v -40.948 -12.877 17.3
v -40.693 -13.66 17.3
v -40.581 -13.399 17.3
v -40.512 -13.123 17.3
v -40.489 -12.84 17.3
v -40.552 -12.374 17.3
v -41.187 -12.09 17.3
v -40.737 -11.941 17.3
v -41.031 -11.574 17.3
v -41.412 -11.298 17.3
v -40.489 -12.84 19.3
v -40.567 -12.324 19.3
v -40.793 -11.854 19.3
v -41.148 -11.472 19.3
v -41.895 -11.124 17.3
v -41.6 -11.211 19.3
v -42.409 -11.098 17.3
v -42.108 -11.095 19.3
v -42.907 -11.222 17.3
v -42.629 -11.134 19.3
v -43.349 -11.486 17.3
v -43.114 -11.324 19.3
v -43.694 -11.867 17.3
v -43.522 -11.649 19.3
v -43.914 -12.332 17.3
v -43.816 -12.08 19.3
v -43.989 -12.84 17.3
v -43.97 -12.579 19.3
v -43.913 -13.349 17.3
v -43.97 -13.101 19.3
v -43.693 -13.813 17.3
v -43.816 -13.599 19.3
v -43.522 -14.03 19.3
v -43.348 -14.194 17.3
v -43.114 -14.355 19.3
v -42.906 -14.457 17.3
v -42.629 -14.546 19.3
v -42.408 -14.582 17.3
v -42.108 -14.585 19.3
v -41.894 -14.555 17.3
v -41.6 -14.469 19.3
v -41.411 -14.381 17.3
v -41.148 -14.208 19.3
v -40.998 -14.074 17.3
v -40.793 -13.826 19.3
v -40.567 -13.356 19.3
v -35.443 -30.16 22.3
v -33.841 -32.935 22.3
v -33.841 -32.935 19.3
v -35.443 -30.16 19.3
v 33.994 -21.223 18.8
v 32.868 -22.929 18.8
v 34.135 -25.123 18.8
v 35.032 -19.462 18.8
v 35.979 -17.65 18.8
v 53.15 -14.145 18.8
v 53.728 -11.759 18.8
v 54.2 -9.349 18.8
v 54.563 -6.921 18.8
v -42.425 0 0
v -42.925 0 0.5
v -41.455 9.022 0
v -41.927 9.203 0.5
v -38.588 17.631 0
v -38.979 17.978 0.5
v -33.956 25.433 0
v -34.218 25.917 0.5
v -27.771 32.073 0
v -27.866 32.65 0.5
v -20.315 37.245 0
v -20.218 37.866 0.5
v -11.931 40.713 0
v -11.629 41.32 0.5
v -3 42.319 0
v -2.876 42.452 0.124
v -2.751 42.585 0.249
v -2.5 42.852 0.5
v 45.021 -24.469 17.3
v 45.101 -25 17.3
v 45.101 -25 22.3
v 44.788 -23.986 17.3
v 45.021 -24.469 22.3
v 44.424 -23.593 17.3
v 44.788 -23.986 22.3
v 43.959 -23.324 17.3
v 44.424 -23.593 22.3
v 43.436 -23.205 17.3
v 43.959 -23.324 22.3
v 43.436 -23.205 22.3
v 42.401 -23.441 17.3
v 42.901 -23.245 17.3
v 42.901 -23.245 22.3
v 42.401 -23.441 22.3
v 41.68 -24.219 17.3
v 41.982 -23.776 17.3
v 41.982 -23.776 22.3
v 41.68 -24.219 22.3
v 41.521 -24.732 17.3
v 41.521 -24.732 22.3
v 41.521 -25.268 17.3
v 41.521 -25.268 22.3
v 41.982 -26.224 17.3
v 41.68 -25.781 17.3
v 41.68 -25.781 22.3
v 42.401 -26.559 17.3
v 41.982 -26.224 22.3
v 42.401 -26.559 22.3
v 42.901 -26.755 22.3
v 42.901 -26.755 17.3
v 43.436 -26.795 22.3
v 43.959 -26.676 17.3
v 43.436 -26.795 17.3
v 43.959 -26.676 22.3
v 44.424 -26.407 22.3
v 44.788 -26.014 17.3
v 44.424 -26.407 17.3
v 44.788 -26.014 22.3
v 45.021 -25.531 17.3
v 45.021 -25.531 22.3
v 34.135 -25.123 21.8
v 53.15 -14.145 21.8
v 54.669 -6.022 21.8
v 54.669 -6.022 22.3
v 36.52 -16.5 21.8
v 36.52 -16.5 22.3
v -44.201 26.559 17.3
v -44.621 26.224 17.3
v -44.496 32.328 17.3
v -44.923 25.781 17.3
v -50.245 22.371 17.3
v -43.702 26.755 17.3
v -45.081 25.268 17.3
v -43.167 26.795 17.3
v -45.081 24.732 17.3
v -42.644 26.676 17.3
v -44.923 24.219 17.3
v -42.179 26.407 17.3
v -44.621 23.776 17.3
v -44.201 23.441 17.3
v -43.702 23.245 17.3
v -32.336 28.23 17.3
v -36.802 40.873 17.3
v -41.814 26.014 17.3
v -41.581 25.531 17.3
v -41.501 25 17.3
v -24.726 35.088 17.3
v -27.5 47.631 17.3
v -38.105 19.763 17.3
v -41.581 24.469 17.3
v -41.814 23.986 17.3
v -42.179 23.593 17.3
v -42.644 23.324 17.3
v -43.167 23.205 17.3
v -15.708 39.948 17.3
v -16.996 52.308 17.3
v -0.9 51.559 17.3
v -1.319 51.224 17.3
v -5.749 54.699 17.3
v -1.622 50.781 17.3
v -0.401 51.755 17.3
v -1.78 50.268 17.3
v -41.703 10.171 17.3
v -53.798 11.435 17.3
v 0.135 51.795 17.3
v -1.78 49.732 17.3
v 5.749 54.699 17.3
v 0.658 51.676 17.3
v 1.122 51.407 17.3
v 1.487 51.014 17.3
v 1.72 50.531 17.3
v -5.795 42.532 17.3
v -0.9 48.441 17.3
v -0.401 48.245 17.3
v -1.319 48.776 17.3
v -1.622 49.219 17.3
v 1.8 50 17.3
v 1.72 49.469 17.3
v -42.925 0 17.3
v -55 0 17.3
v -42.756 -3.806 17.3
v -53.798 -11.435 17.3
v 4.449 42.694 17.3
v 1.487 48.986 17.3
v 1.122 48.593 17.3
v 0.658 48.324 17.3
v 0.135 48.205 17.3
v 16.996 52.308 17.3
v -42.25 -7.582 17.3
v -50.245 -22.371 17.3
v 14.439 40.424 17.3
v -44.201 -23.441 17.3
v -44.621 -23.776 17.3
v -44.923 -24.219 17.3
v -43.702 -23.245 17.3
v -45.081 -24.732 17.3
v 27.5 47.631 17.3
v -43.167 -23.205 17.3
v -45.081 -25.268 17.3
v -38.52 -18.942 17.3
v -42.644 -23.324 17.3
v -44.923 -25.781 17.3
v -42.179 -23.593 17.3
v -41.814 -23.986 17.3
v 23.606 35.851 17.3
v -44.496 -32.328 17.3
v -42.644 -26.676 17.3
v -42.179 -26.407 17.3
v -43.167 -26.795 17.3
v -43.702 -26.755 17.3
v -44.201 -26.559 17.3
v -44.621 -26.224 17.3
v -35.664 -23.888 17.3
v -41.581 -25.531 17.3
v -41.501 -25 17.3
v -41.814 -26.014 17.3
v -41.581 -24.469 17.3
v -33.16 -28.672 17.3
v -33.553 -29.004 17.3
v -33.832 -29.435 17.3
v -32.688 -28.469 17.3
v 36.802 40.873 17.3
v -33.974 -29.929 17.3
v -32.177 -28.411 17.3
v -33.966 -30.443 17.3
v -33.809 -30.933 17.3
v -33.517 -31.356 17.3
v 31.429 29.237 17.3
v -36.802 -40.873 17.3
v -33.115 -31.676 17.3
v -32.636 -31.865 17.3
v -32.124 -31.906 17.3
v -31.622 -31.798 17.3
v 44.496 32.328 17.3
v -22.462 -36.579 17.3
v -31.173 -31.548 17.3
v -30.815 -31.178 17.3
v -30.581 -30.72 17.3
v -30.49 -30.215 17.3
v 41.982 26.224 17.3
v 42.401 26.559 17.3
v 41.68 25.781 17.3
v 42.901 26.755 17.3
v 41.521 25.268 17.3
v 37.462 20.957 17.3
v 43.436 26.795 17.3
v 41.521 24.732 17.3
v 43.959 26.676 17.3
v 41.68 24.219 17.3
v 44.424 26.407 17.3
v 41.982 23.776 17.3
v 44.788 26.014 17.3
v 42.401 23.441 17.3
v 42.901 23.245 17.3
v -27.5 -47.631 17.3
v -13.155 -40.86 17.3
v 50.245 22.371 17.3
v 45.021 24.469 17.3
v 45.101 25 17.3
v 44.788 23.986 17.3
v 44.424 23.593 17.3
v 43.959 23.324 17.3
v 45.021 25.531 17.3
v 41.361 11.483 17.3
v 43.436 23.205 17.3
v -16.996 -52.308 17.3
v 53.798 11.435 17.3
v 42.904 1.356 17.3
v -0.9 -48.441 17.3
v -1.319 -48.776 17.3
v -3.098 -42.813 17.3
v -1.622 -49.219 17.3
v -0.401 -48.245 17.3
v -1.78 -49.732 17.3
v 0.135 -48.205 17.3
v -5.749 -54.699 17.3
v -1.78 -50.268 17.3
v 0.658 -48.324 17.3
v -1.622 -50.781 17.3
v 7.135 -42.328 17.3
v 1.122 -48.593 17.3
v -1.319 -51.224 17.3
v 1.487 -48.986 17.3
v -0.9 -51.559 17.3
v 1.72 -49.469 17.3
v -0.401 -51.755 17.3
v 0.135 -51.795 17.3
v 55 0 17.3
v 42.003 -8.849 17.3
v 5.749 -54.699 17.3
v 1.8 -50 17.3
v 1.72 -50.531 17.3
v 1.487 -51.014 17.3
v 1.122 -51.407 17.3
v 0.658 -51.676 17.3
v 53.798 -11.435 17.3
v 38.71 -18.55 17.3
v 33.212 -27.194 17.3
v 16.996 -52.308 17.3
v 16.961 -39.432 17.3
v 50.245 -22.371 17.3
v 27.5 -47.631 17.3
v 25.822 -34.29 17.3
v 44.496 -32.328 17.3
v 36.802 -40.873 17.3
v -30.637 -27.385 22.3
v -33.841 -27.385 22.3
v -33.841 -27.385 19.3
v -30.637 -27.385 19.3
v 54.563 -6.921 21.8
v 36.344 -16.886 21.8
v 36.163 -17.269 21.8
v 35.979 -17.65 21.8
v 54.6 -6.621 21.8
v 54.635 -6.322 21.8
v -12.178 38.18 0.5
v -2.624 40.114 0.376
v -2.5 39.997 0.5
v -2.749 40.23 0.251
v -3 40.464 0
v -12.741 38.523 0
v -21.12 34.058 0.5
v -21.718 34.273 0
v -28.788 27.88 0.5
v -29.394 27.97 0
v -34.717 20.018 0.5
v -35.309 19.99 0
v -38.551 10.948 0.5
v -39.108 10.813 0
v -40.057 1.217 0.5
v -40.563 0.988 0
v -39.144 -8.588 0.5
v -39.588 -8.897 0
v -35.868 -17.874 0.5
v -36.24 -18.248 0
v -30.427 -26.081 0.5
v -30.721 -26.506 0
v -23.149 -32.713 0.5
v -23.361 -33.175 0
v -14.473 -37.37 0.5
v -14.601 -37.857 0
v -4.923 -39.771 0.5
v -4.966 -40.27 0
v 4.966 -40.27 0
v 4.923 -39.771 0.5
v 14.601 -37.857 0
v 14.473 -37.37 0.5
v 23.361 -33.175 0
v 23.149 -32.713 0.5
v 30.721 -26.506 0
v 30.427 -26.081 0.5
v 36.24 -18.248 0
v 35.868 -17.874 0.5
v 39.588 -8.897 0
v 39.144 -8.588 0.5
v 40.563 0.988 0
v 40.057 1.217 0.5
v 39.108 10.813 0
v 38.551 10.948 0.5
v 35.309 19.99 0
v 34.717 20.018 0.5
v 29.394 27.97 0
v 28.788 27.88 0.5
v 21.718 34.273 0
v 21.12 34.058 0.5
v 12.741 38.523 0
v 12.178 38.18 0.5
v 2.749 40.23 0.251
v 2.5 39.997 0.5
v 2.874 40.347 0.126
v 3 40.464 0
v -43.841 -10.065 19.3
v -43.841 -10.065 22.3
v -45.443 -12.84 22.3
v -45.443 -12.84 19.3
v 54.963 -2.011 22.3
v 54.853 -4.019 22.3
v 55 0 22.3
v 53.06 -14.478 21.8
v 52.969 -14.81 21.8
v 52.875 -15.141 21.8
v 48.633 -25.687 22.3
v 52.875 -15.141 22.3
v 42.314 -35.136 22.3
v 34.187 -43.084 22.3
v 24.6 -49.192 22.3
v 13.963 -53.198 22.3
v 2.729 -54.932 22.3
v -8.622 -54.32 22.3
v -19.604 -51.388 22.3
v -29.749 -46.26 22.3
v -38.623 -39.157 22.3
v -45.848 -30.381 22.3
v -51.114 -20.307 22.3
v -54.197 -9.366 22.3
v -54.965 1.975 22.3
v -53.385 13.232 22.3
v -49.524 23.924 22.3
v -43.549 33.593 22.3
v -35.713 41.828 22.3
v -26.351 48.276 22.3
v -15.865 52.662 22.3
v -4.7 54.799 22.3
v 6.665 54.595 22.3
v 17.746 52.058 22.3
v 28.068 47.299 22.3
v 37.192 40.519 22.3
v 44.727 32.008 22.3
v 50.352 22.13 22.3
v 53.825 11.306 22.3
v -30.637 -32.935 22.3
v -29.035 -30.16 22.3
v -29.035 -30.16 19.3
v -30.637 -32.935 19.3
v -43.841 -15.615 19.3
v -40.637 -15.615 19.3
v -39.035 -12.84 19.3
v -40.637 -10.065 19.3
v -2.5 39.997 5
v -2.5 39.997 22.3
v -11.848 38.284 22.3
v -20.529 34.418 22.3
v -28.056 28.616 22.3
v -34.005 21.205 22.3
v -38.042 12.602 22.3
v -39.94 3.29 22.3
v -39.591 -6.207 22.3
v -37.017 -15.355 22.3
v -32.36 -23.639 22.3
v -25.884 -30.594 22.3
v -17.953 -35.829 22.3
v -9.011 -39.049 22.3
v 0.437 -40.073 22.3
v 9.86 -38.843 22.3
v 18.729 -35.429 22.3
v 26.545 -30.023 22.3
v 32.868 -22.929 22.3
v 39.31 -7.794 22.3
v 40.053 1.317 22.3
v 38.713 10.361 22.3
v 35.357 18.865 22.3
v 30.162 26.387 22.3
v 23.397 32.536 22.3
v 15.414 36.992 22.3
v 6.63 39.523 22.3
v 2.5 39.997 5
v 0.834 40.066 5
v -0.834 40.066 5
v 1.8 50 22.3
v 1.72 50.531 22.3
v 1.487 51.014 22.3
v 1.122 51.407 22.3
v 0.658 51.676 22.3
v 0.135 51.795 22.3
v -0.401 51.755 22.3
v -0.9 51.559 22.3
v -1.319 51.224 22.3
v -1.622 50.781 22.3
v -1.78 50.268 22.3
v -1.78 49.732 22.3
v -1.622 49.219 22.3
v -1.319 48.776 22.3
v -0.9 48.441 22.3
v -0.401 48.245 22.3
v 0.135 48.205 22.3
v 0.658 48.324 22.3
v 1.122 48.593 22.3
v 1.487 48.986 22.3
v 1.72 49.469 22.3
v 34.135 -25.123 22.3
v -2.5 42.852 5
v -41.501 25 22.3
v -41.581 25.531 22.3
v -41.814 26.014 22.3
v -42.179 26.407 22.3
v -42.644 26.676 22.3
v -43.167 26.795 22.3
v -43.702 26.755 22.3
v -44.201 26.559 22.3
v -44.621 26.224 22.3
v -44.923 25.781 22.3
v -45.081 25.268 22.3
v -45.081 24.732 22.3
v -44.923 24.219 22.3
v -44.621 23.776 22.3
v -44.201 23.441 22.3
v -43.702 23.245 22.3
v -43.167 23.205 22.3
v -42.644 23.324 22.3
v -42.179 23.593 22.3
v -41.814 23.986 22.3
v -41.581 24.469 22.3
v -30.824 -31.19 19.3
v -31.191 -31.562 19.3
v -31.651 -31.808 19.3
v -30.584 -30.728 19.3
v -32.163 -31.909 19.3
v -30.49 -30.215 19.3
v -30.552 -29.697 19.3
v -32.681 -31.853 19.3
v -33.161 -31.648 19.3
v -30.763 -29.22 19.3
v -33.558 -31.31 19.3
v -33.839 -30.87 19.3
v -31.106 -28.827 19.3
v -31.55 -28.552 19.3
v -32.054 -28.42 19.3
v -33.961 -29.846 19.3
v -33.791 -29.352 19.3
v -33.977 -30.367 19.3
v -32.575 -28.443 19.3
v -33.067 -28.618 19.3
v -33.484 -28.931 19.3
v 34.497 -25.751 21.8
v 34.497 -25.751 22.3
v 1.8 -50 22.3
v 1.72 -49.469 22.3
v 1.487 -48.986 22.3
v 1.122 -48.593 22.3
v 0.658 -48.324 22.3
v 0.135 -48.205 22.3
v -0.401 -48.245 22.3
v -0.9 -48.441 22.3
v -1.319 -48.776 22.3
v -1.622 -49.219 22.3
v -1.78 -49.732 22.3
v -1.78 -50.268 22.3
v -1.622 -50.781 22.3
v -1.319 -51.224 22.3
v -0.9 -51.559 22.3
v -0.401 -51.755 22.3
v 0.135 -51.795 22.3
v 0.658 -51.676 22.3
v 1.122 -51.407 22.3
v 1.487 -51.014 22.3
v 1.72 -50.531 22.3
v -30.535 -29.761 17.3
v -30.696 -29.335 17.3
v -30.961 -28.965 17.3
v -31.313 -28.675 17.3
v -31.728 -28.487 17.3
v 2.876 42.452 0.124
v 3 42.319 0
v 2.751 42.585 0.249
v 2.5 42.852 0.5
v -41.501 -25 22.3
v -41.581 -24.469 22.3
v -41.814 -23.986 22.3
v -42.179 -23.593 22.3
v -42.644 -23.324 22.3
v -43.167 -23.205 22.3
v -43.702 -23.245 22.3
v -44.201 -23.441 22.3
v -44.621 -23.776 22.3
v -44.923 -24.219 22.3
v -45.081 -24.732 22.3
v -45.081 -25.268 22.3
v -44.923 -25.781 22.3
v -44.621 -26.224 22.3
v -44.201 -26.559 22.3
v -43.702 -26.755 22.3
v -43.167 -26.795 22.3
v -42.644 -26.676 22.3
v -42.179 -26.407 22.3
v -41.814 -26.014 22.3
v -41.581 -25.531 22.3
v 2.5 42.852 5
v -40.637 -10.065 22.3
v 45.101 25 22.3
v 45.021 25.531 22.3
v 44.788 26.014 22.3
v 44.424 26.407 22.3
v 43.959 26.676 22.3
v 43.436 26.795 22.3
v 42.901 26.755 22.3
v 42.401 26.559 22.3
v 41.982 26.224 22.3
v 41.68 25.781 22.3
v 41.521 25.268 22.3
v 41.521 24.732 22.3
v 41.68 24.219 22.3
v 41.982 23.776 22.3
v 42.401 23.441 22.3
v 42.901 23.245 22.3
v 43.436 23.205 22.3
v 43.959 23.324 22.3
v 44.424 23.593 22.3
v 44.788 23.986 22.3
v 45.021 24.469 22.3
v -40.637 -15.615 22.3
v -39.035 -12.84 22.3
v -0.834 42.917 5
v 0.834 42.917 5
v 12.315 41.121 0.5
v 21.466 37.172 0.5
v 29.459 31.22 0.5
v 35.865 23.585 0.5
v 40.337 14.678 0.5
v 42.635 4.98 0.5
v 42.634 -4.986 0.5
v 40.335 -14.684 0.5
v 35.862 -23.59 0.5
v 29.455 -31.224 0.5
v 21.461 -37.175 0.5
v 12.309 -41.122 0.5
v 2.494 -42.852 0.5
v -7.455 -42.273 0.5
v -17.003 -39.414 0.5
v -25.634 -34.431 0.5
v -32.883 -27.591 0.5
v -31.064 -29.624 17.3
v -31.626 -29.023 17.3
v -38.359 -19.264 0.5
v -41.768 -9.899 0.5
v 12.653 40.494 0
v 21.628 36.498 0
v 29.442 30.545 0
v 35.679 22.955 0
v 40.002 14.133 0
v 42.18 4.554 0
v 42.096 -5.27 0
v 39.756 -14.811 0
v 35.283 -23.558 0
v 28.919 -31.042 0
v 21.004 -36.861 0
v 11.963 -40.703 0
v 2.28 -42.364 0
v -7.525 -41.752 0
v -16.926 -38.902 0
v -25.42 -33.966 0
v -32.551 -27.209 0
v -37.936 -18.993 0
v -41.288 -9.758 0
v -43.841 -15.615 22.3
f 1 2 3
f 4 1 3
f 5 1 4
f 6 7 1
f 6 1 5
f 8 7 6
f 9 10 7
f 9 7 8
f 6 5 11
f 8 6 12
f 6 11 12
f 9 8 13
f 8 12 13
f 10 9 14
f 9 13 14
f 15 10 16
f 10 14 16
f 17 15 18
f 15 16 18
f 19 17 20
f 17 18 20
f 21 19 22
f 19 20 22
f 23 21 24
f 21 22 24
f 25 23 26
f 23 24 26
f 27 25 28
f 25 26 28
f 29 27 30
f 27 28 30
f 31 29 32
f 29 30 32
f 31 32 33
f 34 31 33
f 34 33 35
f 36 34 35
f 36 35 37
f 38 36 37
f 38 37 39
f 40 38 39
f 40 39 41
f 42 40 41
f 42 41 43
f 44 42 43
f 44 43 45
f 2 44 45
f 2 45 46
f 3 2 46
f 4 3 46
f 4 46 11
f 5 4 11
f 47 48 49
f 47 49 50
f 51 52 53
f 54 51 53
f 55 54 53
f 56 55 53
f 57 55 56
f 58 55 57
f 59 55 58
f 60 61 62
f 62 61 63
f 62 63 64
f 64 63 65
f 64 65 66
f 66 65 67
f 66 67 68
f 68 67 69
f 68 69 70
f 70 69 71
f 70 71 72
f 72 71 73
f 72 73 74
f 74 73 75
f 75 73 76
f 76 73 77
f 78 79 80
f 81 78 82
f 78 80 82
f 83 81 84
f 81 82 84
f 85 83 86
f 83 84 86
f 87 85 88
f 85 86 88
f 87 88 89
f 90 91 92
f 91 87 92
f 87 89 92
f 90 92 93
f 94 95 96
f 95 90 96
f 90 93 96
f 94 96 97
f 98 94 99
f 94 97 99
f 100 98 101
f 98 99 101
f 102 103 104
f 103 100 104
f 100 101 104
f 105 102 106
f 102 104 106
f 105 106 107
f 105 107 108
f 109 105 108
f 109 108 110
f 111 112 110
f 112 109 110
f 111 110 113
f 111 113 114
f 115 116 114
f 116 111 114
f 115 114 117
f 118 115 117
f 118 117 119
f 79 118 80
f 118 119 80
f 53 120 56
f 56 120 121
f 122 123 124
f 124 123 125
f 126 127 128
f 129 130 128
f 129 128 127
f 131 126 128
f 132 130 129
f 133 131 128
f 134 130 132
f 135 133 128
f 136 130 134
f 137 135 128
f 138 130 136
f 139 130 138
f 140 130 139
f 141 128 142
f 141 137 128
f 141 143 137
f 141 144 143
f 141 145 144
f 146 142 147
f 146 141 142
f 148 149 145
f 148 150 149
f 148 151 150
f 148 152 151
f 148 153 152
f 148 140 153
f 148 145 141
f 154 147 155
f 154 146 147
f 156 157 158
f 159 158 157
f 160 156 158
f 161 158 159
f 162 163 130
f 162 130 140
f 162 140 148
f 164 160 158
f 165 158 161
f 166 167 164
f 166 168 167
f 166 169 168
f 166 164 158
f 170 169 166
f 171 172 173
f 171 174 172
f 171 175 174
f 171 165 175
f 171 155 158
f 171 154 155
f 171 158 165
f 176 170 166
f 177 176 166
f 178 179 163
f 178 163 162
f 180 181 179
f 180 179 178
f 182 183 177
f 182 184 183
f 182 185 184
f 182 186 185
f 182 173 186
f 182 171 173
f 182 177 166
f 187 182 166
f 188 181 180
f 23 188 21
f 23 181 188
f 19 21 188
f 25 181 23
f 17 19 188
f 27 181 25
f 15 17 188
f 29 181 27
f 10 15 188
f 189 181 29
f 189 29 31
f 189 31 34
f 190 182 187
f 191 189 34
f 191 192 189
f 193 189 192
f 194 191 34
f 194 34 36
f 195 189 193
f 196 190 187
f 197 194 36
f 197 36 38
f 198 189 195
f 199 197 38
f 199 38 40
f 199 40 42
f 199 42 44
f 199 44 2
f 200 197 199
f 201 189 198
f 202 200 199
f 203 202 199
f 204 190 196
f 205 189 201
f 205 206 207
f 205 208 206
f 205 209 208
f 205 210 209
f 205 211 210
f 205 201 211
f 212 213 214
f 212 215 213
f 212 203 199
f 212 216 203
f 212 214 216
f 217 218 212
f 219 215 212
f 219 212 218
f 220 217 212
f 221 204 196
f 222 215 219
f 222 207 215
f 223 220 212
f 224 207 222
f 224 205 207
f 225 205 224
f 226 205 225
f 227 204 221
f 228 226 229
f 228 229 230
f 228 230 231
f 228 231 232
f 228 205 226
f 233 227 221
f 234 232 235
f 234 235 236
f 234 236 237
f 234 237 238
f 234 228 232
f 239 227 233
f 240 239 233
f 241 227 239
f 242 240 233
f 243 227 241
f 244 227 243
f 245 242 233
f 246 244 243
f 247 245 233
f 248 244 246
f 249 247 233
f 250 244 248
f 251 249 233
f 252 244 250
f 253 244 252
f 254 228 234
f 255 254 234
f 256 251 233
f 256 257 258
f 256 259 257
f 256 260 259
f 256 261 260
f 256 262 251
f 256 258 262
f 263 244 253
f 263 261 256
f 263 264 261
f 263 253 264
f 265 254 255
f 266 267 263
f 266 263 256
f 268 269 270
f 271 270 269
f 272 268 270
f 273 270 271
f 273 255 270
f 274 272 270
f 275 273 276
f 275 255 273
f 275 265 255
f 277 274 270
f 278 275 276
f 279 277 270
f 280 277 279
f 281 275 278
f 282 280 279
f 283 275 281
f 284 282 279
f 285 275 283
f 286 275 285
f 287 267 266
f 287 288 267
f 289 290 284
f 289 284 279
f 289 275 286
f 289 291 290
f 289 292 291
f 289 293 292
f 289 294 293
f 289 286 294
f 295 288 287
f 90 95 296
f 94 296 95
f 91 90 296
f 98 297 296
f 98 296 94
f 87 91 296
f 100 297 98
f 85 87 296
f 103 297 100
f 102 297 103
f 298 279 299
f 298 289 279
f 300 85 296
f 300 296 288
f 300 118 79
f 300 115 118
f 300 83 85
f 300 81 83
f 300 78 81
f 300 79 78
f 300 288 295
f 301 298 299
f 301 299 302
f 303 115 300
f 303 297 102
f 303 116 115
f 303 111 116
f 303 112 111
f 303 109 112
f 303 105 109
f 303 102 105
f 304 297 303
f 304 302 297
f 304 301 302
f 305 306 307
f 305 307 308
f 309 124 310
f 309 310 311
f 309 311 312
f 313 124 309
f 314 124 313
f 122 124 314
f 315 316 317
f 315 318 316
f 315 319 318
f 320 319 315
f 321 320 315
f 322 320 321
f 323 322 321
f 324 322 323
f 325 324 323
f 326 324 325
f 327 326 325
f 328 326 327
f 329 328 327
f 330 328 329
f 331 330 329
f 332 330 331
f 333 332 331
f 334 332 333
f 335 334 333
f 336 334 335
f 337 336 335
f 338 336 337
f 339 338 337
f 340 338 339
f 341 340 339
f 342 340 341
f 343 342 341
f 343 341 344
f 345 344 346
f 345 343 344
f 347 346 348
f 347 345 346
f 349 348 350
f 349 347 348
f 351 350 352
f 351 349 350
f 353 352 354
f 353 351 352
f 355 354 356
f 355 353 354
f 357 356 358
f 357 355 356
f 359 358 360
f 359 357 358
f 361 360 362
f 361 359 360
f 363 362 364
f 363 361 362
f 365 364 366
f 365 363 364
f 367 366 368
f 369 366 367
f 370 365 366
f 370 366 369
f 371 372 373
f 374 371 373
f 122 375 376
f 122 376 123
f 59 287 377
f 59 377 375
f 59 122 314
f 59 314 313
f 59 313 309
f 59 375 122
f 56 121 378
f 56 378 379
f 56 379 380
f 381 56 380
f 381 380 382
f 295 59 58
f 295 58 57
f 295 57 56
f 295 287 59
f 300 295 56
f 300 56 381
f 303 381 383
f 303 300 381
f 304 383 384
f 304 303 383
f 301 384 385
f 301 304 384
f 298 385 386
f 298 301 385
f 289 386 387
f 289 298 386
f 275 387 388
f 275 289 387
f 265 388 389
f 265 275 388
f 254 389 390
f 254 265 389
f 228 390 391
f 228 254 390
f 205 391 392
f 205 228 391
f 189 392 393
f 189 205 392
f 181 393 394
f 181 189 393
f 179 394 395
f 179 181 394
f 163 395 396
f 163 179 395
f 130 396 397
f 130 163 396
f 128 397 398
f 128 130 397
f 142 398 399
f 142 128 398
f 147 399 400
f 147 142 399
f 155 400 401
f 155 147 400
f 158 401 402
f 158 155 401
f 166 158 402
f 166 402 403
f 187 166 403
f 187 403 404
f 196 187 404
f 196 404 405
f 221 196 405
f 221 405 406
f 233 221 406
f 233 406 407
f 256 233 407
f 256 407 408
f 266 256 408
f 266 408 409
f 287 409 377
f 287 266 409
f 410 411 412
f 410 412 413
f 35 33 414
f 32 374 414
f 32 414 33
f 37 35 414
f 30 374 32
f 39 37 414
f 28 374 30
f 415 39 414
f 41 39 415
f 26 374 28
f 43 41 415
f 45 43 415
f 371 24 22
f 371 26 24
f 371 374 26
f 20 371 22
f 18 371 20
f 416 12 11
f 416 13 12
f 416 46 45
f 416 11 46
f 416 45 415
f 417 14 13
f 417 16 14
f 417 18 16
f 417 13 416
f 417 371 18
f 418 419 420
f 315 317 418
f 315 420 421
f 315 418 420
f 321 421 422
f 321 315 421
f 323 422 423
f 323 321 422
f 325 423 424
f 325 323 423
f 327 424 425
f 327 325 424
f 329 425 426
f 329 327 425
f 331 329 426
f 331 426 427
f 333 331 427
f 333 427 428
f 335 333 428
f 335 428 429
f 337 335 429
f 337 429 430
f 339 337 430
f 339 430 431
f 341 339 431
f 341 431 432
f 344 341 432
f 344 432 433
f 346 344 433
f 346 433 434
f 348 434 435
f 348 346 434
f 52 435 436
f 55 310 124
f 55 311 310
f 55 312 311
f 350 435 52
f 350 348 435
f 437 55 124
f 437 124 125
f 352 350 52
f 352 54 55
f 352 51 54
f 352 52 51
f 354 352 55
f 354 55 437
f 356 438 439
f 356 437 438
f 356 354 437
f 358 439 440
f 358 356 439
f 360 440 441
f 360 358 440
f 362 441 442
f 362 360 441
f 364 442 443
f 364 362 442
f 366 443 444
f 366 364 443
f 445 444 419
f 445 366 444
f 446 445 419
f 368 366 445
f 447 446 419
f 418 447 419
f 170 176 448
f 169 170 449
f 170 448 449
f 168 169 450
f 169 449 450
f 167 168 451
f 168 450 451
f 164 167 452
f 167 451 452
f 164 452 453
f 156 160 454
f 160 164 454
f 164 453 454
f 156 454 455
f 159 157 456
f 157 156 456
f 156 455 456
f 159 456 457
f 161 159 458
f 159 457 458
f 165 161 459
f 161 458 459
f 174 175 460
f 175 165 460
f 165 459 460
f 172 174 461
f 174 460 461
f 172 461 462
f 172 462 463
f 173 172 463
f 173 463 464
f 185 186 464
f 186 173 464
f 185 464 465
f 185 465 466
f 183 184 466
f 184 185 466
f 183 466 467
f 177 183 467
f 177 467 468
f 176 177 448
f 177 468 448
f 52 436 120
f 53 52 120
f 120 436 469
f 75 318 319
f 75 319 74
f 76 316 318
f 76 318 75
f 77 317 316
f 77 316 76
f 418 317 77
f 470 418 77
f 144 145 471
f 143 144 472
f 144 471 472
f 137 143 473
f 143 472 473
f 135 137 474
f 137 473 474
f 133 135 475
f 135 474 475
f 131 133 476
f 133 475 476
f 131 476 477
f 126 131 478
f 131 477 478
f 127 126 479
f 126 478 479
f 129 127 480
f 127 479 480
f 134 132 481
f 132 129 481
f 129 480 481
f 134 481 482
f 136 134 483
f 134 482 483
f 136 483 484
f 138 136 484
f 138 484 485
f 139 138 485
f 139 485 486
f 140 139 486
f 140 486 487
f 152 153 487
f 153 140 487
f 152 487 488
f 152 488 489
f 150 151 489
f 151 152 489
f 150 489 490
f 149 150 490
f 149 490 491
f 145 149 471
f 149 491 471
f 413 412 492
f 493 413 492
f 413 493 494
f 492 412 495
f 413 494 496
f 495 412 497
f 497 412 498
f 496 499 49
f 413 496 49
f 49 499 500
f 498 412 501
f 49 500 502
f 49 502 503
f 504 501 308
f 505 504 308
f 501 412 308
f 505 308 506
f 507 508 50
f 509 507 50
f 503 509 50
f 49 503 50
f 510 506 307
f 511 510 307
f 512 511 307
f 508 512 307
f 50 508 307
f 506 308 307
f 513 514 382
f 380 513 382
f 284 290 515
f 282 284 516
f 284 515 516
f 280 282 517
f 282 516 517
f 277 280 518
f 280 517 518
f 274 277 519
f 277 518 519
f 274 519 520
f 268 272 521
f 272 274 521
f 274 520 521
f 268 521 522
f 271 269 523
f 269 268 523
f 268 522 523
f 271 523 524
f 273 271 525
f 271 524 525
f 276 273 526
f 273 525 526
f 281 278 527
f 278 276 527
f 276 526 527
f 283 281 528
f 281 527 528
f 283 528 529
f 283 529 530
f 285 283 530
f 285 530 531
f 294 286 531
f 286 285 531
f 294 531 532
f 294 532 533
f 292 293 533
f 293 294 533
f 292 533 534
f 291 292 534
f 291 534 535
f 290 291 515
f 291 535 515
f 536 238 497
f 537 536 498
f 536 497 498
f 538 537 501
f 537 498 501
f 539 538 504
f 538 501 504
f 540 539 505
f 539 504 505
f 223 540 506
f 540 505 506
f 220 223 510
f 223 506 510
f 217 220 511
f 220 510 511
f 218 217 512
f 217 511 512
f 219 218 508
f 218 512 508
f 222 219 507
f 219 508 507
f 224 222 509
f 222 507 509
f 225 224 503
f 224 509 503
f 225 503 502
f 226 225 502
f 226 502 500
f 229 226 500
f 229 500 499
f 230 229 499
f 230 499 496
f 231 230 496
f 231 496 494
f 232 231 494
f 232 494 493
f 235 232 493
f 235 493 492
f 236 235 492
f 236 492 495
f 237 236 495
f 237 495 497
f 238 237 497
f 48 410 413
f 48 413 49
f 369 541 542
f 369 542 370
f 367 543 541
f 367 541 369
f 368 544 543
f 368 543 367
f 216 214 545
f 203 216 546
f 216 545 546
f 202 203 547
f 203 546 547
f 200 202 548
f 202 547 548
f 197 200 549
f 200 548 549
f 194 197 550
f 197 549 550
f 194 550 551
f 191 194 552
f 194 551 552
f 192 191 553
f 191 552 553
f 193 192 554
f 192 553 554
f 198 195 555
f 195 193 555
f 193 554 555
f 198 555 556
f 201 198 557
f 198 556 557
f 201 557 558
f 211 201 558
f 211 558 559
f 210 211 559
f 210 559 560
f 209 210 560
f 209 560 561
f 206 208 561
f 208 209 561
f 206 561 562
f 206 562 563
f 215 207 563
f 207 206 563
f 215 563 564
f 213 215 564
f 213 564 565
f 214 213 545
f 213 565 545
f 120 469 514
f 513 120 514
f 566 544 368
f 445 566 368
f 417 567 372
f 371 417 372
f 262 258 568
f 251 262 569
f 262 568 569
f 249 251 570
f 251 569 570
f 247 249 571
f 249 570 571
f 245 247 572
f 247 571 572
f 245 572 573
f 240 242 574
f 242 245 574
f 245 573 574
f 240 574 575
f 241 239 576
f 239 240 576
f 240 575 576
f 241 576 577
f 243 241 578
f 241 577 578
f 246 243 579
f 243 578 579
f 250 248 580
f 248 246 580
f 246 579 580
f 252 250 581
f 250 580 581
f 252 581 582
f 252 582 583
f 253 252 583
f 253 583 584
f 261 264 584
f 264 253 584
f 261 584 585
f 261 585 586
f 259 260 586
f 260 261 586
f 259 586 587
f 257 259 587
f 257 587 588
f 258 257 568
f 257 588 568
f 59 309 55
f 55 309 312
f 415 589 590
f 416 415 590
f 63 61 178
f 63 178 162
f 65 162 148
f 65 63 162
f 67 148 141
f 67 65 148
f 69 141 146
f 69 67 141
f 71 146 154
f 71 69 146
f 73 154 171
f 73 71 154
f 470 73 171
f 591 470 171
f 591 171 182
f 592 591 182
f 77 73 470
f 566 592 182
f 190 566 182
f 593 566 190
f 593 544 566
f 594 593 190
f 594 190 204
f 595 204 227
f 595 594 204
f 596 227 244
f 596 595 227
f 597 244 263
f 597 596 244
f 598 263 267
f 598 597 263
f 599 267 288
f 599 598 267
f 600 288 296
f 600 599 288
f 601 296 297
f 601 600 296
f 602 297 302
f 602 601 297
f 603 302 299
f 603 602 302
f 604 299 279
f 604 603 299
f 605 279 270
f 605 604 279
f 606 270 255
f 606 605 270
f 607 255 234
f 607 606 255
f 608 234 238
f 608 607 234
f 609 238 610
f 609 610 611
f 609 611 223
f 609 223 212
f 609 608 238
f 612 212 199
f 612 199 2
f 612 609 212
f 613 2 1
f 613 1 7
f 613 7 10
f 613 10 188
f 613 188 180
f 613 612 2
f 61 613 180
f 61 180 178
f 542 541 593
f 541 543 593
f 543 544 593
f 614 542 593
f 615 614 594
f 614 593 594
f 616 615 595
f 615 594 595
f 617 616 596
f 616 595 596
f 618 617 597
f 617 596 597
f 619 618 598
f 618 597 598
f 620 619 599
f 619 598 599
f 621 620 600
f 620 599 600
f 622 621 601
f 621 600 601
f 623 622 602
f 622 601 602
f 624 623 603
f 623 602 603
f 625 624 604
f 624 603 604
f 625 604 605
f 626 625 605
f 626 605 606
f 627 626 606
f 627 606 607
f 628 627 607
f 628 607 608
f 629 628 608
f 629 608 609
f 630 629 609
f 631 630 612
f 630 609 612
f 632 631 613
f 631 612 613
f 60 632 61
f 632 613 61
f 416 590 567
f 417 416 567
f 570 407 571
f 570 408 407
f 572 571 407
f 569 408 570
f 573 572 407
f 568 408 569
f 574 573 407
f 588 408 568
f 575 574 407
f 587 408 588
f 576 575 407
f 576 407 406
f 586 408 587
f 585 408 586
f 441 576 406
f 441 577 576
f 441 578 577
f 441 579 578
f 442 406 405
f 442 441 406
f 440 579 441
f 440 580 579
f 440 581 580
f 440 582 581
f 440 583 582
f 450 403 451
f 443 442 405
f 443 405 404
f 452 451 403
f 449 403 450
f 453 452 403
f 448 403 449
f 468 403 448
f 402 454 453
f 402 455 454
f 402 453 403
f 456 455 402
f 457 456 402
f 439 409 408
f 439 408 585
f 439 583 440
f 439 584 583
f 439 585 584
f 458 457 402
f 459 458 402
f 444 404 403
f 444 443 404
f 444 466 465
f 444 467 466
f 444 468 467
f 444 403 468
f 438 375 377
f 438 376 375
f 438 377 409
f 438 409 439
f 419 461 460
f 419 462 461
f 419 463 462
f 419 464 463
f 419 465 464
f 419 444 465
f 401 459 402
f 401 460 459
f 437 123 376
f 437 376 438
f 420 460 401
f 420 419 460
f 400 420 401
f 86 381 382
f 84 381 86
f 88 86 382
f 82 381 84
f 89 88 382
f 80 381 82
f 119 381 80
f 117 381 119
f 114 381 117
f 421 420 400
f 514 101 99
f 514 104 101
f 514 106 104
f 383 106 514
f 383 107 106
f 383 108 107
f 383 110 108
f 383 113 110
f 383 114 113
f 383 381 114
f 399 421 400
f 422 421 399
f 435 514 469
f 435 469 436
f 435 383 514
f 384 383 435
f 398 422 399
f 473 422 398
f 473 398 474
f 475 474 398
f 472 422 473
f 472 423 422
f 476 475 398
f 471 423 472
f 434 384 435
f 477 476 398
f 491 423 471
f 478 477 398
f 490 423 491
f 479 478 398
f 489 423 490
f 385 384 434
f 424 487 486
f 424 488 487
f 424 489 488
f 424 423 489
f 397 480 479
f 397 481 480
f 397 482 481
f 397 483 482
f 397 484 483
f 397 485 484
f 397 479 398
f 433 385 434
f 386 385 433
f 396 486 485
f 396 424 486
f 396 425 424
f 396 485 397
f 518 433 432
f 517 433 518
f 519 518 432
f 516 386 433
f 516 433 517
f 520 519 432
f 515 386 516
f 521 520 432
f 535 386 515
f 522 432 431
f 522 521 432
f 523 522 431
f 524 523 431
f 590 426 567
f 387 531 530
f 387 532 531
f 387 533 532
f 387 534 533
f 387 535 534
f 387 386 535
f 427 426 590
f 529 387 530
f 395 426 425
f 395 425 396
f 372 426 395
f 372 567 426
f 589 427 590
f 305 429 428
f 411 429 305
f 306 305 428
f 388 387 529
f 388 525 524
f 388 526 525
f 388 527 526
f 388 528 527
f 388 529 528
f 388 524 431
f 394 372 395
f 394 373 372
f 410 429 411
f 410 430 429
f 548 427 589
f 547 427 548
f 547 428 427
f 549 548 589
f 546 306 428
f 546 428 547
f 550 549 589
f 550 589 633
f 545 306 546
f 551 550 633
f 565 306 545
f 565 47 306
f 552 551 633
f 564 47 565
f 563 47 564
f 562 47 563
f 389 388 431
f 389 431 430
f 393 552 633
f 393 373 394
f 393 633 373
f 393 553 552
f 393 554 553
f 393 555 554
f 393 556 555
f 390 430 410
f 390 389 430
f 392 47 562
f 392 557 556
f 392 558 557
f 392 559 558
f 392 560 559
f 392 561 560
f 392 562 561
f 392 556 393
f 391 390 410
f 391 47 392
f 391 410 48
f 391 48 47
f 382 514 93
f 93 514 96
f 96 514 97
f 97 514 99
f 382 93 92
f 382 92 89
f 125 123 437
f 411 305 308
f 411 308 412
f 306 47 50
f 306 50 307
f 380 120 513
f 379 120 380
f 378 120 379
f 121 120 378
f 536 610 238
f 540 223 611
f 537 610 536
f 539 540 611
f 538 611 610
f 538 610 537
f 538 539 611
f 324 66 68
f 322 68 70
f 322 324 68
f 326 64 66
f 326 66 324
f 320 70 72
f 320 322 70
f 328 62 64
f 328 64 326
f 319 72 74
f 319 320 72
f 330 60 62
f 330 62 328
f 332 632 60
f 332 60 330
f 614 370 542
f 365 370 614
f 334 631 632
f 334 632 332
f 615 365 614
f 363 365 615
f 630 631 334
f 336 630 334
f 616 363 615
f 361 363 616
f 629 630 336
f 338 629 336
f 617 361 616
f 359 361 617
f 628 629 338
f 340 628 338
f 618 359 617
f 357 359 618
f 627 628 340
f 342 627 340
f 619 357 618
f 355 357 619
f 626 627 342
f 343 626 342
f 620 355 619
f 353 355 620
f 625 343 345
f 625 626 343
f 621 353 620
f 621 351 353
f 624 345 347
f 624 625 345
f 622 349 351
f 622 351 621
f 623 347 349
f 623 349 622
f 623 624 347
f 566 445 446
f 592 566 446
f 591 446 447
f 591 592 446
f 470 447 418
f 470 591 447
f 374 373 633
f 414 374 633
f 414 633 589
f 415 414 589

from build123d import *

# Parameters (mm, degrees)
SKETCH2_R           = 1.8
CUT_EXTRUDE1_DEPTH  = 11
CUT_EXTRUDE2_DEPTH  = 5
SKETCH4_OUTSIDE_W   = 143.43
SKETCH4_OUTSIDE_H   = 143.43
SKETCH4_OUTSIDE_R   = 42.925
CUT_EXTRUDE3_DEPTH  = 17.3
SKETCH6_R           = 40.075
CUT_EXTRUDE5_DEPTH  = 81.915326113
CHAMFER1_SIZE       = 0.5
CUT_EXTRUDE6_DEPTH  = 3.5
CUT_EXTRUDE7_DEPTH  = 3
SKETCH9_R           = 1.75
CUT_EXTRUDE9_DEPTH  = 5
CUT_EXTRUDE10_DEPTH = 0.5


with BuildPart() as part:
    # Sketch1 → Revolve1 (revolve)
    with BuildSketch(Plane(origin=(0, 0, 0), x_dir=(1, 0, 0), z_dir=(0, 1, 0))):
        Polygon((35, 0), (35, -22.3), (55, -22.3), (55, -17.3), (49, -17.3), (49, 0), align=None)
    revolve(axis=Axis((0, 0, 94.21875), (0, 0, -1)))

    # Sketch2 → Cut-Extrude1 (cut)
    with BuildSketch(Plane.XY.offset(22.3)):
        with Locations((0, 50)):
            Circle(SKETCH2_R)
        with Locations((43.301270189, 25)):
            Circle(SKETCH2_R)
        with Locations((43.301270189, -25)):
            Circle(SKETCH2_R)
        with Locations((0, -50)):
            Circle(SKETCH2_R)
        with Locations((-43.301270189, -25)):
            Circle(SKETCH2_R)
        with Locations((-43.301270189, 25)):
            Circle(SKETCH2_R)
    extrude(amount=-CUT_EXTRUDE1_DEPTH, mode=Mode.SUBTRACT)

    # Sketch3 → Cut-Extrude2 (cut)
    with BuildSketch(Plane.XY):
        with BuildLine():
            Line((2.5, 48.936182932), (2.5, 34.910600109))
            ThreePointArc((2.5, 34.910600109), (0, 35), (-2.5, 34.910600109))
            Line((-2.5, 34.910600109), (-2.5, 48.936182932))
            ThreePointArc((-2.5, 48.936182932), (0, 49), (2.5, 48.936182932))
        make_face()
    extrude(amount=CUT_EXTRUDE2_DEPTH, mode=Mode.SUBTRACT)

    # Sketch4 outside → Cut-Extrude3 (cut)
    with BuildSketch(Plane(origin=(0, 0, 0), x_dir=(-1, 0, 0), z_dir=(0, 0, -1))):
        Rectangle(SKETCH4_OUTSIDE_W, SKETCH4_OUTSIDE_H)
        Circle(SKETCH4_OUTSIDE_R, mode=Mode.SUBTRACT)
    extrude(amount=-CUT_EXTRUDE3_DEPTH, mode=Mode.SUBTRACT)

    # Sketch6 → Cut-Extrude5 (cut, through all)
    with BuildSketch(Plane.XY):
        with Locations(Location((0, 0, 0), (0, 0, 93.576606812))):
            Circle(SKETCH6_R)
    extrude(amount=CUT_EXTRUDE5_DEPTH, mode=Mode.SUBTRACT)

    # Chamfer1
    chamfer1_edges = [part.edges().sort_by_distance(p)[0] for p in [
        (2.5, 41.424540979, 0),
        (0, -40.075, 0),
        (-2.5, 41.424540979, 0),
        (29.455416522, -31.223934129, 0),
    ]]
    chamfer(chamfer1_edges, length=CHAMFER1_SIZE)

    # Sketch7 → Cut-Extrude6 (cut)
    with BuildSketch(Plane.XY.offset(22.3)):
        Polygon((31.359931864, -20.316995311), (34.134931864, -25.123436302), (58.38364317, -11.123436302), (55.60864317, -6.316995311), align=None)
    extrude(amount=-CUT_EXTRUDE6_DEPTH, mode=Mode.SUBTRACT)

    # Sketch8 → Cut-Extrude7 (cut)
    with BuildSketch(Plane.XY.offset(22.3)):
        Polygon((-29.034798369, -30.160254038), (-30.636945366, -32.935254038), (-33.84123936, -32.935254038), (-35.443386357, -30.160254038), (-33.84123936, -27.385254038), (-30.636945366, -27.385254038), align=None)
        Polygon((-43.84123936, -10.064745962), (-45.443386357, -12.839745962), (-43.84123936, -15.614745962), (-40.636945366, -15.614745962), (-39.034798369, -12.839745962), (-40.636945366, -10.064745962), align=None)
    extrude(amount=-CUT_EXTRUDE7_DEPTH, mode=Mode.SUBTRACT)

    # Sketch9 → Cut-Extrude9 (cut)
    with BuildSketch(Plane.XY.offset(22.3)):
        with Locations((-42.239092363, -12.839745962)):
            Circle(SKETCH9_R)
        with Locations(Location((-32.239092363, -30.160254038, 0), (0, 0, 358.221796194))):
            Circle(SKETCH9_R)
    extrude(amount=-CUT_EXTRUDE9_DEPTH, mode=Mode.SUBTRACT)

    # Sketch10 → Cut-Extrude10 (cut)
    with BuildSketch(Plane.XY.offset(22.3)):
        Polygon((30.997431864, -19.689126893), (34.497431864, -25.75130472), (59.162085788, -11.511160138), (55.662085788, -5.448982311), align=None)
    extrude(amount=-CUT_EXTRUDE10_DEPTH, mode=Mode.SUBTRACT)


solid = part.part
